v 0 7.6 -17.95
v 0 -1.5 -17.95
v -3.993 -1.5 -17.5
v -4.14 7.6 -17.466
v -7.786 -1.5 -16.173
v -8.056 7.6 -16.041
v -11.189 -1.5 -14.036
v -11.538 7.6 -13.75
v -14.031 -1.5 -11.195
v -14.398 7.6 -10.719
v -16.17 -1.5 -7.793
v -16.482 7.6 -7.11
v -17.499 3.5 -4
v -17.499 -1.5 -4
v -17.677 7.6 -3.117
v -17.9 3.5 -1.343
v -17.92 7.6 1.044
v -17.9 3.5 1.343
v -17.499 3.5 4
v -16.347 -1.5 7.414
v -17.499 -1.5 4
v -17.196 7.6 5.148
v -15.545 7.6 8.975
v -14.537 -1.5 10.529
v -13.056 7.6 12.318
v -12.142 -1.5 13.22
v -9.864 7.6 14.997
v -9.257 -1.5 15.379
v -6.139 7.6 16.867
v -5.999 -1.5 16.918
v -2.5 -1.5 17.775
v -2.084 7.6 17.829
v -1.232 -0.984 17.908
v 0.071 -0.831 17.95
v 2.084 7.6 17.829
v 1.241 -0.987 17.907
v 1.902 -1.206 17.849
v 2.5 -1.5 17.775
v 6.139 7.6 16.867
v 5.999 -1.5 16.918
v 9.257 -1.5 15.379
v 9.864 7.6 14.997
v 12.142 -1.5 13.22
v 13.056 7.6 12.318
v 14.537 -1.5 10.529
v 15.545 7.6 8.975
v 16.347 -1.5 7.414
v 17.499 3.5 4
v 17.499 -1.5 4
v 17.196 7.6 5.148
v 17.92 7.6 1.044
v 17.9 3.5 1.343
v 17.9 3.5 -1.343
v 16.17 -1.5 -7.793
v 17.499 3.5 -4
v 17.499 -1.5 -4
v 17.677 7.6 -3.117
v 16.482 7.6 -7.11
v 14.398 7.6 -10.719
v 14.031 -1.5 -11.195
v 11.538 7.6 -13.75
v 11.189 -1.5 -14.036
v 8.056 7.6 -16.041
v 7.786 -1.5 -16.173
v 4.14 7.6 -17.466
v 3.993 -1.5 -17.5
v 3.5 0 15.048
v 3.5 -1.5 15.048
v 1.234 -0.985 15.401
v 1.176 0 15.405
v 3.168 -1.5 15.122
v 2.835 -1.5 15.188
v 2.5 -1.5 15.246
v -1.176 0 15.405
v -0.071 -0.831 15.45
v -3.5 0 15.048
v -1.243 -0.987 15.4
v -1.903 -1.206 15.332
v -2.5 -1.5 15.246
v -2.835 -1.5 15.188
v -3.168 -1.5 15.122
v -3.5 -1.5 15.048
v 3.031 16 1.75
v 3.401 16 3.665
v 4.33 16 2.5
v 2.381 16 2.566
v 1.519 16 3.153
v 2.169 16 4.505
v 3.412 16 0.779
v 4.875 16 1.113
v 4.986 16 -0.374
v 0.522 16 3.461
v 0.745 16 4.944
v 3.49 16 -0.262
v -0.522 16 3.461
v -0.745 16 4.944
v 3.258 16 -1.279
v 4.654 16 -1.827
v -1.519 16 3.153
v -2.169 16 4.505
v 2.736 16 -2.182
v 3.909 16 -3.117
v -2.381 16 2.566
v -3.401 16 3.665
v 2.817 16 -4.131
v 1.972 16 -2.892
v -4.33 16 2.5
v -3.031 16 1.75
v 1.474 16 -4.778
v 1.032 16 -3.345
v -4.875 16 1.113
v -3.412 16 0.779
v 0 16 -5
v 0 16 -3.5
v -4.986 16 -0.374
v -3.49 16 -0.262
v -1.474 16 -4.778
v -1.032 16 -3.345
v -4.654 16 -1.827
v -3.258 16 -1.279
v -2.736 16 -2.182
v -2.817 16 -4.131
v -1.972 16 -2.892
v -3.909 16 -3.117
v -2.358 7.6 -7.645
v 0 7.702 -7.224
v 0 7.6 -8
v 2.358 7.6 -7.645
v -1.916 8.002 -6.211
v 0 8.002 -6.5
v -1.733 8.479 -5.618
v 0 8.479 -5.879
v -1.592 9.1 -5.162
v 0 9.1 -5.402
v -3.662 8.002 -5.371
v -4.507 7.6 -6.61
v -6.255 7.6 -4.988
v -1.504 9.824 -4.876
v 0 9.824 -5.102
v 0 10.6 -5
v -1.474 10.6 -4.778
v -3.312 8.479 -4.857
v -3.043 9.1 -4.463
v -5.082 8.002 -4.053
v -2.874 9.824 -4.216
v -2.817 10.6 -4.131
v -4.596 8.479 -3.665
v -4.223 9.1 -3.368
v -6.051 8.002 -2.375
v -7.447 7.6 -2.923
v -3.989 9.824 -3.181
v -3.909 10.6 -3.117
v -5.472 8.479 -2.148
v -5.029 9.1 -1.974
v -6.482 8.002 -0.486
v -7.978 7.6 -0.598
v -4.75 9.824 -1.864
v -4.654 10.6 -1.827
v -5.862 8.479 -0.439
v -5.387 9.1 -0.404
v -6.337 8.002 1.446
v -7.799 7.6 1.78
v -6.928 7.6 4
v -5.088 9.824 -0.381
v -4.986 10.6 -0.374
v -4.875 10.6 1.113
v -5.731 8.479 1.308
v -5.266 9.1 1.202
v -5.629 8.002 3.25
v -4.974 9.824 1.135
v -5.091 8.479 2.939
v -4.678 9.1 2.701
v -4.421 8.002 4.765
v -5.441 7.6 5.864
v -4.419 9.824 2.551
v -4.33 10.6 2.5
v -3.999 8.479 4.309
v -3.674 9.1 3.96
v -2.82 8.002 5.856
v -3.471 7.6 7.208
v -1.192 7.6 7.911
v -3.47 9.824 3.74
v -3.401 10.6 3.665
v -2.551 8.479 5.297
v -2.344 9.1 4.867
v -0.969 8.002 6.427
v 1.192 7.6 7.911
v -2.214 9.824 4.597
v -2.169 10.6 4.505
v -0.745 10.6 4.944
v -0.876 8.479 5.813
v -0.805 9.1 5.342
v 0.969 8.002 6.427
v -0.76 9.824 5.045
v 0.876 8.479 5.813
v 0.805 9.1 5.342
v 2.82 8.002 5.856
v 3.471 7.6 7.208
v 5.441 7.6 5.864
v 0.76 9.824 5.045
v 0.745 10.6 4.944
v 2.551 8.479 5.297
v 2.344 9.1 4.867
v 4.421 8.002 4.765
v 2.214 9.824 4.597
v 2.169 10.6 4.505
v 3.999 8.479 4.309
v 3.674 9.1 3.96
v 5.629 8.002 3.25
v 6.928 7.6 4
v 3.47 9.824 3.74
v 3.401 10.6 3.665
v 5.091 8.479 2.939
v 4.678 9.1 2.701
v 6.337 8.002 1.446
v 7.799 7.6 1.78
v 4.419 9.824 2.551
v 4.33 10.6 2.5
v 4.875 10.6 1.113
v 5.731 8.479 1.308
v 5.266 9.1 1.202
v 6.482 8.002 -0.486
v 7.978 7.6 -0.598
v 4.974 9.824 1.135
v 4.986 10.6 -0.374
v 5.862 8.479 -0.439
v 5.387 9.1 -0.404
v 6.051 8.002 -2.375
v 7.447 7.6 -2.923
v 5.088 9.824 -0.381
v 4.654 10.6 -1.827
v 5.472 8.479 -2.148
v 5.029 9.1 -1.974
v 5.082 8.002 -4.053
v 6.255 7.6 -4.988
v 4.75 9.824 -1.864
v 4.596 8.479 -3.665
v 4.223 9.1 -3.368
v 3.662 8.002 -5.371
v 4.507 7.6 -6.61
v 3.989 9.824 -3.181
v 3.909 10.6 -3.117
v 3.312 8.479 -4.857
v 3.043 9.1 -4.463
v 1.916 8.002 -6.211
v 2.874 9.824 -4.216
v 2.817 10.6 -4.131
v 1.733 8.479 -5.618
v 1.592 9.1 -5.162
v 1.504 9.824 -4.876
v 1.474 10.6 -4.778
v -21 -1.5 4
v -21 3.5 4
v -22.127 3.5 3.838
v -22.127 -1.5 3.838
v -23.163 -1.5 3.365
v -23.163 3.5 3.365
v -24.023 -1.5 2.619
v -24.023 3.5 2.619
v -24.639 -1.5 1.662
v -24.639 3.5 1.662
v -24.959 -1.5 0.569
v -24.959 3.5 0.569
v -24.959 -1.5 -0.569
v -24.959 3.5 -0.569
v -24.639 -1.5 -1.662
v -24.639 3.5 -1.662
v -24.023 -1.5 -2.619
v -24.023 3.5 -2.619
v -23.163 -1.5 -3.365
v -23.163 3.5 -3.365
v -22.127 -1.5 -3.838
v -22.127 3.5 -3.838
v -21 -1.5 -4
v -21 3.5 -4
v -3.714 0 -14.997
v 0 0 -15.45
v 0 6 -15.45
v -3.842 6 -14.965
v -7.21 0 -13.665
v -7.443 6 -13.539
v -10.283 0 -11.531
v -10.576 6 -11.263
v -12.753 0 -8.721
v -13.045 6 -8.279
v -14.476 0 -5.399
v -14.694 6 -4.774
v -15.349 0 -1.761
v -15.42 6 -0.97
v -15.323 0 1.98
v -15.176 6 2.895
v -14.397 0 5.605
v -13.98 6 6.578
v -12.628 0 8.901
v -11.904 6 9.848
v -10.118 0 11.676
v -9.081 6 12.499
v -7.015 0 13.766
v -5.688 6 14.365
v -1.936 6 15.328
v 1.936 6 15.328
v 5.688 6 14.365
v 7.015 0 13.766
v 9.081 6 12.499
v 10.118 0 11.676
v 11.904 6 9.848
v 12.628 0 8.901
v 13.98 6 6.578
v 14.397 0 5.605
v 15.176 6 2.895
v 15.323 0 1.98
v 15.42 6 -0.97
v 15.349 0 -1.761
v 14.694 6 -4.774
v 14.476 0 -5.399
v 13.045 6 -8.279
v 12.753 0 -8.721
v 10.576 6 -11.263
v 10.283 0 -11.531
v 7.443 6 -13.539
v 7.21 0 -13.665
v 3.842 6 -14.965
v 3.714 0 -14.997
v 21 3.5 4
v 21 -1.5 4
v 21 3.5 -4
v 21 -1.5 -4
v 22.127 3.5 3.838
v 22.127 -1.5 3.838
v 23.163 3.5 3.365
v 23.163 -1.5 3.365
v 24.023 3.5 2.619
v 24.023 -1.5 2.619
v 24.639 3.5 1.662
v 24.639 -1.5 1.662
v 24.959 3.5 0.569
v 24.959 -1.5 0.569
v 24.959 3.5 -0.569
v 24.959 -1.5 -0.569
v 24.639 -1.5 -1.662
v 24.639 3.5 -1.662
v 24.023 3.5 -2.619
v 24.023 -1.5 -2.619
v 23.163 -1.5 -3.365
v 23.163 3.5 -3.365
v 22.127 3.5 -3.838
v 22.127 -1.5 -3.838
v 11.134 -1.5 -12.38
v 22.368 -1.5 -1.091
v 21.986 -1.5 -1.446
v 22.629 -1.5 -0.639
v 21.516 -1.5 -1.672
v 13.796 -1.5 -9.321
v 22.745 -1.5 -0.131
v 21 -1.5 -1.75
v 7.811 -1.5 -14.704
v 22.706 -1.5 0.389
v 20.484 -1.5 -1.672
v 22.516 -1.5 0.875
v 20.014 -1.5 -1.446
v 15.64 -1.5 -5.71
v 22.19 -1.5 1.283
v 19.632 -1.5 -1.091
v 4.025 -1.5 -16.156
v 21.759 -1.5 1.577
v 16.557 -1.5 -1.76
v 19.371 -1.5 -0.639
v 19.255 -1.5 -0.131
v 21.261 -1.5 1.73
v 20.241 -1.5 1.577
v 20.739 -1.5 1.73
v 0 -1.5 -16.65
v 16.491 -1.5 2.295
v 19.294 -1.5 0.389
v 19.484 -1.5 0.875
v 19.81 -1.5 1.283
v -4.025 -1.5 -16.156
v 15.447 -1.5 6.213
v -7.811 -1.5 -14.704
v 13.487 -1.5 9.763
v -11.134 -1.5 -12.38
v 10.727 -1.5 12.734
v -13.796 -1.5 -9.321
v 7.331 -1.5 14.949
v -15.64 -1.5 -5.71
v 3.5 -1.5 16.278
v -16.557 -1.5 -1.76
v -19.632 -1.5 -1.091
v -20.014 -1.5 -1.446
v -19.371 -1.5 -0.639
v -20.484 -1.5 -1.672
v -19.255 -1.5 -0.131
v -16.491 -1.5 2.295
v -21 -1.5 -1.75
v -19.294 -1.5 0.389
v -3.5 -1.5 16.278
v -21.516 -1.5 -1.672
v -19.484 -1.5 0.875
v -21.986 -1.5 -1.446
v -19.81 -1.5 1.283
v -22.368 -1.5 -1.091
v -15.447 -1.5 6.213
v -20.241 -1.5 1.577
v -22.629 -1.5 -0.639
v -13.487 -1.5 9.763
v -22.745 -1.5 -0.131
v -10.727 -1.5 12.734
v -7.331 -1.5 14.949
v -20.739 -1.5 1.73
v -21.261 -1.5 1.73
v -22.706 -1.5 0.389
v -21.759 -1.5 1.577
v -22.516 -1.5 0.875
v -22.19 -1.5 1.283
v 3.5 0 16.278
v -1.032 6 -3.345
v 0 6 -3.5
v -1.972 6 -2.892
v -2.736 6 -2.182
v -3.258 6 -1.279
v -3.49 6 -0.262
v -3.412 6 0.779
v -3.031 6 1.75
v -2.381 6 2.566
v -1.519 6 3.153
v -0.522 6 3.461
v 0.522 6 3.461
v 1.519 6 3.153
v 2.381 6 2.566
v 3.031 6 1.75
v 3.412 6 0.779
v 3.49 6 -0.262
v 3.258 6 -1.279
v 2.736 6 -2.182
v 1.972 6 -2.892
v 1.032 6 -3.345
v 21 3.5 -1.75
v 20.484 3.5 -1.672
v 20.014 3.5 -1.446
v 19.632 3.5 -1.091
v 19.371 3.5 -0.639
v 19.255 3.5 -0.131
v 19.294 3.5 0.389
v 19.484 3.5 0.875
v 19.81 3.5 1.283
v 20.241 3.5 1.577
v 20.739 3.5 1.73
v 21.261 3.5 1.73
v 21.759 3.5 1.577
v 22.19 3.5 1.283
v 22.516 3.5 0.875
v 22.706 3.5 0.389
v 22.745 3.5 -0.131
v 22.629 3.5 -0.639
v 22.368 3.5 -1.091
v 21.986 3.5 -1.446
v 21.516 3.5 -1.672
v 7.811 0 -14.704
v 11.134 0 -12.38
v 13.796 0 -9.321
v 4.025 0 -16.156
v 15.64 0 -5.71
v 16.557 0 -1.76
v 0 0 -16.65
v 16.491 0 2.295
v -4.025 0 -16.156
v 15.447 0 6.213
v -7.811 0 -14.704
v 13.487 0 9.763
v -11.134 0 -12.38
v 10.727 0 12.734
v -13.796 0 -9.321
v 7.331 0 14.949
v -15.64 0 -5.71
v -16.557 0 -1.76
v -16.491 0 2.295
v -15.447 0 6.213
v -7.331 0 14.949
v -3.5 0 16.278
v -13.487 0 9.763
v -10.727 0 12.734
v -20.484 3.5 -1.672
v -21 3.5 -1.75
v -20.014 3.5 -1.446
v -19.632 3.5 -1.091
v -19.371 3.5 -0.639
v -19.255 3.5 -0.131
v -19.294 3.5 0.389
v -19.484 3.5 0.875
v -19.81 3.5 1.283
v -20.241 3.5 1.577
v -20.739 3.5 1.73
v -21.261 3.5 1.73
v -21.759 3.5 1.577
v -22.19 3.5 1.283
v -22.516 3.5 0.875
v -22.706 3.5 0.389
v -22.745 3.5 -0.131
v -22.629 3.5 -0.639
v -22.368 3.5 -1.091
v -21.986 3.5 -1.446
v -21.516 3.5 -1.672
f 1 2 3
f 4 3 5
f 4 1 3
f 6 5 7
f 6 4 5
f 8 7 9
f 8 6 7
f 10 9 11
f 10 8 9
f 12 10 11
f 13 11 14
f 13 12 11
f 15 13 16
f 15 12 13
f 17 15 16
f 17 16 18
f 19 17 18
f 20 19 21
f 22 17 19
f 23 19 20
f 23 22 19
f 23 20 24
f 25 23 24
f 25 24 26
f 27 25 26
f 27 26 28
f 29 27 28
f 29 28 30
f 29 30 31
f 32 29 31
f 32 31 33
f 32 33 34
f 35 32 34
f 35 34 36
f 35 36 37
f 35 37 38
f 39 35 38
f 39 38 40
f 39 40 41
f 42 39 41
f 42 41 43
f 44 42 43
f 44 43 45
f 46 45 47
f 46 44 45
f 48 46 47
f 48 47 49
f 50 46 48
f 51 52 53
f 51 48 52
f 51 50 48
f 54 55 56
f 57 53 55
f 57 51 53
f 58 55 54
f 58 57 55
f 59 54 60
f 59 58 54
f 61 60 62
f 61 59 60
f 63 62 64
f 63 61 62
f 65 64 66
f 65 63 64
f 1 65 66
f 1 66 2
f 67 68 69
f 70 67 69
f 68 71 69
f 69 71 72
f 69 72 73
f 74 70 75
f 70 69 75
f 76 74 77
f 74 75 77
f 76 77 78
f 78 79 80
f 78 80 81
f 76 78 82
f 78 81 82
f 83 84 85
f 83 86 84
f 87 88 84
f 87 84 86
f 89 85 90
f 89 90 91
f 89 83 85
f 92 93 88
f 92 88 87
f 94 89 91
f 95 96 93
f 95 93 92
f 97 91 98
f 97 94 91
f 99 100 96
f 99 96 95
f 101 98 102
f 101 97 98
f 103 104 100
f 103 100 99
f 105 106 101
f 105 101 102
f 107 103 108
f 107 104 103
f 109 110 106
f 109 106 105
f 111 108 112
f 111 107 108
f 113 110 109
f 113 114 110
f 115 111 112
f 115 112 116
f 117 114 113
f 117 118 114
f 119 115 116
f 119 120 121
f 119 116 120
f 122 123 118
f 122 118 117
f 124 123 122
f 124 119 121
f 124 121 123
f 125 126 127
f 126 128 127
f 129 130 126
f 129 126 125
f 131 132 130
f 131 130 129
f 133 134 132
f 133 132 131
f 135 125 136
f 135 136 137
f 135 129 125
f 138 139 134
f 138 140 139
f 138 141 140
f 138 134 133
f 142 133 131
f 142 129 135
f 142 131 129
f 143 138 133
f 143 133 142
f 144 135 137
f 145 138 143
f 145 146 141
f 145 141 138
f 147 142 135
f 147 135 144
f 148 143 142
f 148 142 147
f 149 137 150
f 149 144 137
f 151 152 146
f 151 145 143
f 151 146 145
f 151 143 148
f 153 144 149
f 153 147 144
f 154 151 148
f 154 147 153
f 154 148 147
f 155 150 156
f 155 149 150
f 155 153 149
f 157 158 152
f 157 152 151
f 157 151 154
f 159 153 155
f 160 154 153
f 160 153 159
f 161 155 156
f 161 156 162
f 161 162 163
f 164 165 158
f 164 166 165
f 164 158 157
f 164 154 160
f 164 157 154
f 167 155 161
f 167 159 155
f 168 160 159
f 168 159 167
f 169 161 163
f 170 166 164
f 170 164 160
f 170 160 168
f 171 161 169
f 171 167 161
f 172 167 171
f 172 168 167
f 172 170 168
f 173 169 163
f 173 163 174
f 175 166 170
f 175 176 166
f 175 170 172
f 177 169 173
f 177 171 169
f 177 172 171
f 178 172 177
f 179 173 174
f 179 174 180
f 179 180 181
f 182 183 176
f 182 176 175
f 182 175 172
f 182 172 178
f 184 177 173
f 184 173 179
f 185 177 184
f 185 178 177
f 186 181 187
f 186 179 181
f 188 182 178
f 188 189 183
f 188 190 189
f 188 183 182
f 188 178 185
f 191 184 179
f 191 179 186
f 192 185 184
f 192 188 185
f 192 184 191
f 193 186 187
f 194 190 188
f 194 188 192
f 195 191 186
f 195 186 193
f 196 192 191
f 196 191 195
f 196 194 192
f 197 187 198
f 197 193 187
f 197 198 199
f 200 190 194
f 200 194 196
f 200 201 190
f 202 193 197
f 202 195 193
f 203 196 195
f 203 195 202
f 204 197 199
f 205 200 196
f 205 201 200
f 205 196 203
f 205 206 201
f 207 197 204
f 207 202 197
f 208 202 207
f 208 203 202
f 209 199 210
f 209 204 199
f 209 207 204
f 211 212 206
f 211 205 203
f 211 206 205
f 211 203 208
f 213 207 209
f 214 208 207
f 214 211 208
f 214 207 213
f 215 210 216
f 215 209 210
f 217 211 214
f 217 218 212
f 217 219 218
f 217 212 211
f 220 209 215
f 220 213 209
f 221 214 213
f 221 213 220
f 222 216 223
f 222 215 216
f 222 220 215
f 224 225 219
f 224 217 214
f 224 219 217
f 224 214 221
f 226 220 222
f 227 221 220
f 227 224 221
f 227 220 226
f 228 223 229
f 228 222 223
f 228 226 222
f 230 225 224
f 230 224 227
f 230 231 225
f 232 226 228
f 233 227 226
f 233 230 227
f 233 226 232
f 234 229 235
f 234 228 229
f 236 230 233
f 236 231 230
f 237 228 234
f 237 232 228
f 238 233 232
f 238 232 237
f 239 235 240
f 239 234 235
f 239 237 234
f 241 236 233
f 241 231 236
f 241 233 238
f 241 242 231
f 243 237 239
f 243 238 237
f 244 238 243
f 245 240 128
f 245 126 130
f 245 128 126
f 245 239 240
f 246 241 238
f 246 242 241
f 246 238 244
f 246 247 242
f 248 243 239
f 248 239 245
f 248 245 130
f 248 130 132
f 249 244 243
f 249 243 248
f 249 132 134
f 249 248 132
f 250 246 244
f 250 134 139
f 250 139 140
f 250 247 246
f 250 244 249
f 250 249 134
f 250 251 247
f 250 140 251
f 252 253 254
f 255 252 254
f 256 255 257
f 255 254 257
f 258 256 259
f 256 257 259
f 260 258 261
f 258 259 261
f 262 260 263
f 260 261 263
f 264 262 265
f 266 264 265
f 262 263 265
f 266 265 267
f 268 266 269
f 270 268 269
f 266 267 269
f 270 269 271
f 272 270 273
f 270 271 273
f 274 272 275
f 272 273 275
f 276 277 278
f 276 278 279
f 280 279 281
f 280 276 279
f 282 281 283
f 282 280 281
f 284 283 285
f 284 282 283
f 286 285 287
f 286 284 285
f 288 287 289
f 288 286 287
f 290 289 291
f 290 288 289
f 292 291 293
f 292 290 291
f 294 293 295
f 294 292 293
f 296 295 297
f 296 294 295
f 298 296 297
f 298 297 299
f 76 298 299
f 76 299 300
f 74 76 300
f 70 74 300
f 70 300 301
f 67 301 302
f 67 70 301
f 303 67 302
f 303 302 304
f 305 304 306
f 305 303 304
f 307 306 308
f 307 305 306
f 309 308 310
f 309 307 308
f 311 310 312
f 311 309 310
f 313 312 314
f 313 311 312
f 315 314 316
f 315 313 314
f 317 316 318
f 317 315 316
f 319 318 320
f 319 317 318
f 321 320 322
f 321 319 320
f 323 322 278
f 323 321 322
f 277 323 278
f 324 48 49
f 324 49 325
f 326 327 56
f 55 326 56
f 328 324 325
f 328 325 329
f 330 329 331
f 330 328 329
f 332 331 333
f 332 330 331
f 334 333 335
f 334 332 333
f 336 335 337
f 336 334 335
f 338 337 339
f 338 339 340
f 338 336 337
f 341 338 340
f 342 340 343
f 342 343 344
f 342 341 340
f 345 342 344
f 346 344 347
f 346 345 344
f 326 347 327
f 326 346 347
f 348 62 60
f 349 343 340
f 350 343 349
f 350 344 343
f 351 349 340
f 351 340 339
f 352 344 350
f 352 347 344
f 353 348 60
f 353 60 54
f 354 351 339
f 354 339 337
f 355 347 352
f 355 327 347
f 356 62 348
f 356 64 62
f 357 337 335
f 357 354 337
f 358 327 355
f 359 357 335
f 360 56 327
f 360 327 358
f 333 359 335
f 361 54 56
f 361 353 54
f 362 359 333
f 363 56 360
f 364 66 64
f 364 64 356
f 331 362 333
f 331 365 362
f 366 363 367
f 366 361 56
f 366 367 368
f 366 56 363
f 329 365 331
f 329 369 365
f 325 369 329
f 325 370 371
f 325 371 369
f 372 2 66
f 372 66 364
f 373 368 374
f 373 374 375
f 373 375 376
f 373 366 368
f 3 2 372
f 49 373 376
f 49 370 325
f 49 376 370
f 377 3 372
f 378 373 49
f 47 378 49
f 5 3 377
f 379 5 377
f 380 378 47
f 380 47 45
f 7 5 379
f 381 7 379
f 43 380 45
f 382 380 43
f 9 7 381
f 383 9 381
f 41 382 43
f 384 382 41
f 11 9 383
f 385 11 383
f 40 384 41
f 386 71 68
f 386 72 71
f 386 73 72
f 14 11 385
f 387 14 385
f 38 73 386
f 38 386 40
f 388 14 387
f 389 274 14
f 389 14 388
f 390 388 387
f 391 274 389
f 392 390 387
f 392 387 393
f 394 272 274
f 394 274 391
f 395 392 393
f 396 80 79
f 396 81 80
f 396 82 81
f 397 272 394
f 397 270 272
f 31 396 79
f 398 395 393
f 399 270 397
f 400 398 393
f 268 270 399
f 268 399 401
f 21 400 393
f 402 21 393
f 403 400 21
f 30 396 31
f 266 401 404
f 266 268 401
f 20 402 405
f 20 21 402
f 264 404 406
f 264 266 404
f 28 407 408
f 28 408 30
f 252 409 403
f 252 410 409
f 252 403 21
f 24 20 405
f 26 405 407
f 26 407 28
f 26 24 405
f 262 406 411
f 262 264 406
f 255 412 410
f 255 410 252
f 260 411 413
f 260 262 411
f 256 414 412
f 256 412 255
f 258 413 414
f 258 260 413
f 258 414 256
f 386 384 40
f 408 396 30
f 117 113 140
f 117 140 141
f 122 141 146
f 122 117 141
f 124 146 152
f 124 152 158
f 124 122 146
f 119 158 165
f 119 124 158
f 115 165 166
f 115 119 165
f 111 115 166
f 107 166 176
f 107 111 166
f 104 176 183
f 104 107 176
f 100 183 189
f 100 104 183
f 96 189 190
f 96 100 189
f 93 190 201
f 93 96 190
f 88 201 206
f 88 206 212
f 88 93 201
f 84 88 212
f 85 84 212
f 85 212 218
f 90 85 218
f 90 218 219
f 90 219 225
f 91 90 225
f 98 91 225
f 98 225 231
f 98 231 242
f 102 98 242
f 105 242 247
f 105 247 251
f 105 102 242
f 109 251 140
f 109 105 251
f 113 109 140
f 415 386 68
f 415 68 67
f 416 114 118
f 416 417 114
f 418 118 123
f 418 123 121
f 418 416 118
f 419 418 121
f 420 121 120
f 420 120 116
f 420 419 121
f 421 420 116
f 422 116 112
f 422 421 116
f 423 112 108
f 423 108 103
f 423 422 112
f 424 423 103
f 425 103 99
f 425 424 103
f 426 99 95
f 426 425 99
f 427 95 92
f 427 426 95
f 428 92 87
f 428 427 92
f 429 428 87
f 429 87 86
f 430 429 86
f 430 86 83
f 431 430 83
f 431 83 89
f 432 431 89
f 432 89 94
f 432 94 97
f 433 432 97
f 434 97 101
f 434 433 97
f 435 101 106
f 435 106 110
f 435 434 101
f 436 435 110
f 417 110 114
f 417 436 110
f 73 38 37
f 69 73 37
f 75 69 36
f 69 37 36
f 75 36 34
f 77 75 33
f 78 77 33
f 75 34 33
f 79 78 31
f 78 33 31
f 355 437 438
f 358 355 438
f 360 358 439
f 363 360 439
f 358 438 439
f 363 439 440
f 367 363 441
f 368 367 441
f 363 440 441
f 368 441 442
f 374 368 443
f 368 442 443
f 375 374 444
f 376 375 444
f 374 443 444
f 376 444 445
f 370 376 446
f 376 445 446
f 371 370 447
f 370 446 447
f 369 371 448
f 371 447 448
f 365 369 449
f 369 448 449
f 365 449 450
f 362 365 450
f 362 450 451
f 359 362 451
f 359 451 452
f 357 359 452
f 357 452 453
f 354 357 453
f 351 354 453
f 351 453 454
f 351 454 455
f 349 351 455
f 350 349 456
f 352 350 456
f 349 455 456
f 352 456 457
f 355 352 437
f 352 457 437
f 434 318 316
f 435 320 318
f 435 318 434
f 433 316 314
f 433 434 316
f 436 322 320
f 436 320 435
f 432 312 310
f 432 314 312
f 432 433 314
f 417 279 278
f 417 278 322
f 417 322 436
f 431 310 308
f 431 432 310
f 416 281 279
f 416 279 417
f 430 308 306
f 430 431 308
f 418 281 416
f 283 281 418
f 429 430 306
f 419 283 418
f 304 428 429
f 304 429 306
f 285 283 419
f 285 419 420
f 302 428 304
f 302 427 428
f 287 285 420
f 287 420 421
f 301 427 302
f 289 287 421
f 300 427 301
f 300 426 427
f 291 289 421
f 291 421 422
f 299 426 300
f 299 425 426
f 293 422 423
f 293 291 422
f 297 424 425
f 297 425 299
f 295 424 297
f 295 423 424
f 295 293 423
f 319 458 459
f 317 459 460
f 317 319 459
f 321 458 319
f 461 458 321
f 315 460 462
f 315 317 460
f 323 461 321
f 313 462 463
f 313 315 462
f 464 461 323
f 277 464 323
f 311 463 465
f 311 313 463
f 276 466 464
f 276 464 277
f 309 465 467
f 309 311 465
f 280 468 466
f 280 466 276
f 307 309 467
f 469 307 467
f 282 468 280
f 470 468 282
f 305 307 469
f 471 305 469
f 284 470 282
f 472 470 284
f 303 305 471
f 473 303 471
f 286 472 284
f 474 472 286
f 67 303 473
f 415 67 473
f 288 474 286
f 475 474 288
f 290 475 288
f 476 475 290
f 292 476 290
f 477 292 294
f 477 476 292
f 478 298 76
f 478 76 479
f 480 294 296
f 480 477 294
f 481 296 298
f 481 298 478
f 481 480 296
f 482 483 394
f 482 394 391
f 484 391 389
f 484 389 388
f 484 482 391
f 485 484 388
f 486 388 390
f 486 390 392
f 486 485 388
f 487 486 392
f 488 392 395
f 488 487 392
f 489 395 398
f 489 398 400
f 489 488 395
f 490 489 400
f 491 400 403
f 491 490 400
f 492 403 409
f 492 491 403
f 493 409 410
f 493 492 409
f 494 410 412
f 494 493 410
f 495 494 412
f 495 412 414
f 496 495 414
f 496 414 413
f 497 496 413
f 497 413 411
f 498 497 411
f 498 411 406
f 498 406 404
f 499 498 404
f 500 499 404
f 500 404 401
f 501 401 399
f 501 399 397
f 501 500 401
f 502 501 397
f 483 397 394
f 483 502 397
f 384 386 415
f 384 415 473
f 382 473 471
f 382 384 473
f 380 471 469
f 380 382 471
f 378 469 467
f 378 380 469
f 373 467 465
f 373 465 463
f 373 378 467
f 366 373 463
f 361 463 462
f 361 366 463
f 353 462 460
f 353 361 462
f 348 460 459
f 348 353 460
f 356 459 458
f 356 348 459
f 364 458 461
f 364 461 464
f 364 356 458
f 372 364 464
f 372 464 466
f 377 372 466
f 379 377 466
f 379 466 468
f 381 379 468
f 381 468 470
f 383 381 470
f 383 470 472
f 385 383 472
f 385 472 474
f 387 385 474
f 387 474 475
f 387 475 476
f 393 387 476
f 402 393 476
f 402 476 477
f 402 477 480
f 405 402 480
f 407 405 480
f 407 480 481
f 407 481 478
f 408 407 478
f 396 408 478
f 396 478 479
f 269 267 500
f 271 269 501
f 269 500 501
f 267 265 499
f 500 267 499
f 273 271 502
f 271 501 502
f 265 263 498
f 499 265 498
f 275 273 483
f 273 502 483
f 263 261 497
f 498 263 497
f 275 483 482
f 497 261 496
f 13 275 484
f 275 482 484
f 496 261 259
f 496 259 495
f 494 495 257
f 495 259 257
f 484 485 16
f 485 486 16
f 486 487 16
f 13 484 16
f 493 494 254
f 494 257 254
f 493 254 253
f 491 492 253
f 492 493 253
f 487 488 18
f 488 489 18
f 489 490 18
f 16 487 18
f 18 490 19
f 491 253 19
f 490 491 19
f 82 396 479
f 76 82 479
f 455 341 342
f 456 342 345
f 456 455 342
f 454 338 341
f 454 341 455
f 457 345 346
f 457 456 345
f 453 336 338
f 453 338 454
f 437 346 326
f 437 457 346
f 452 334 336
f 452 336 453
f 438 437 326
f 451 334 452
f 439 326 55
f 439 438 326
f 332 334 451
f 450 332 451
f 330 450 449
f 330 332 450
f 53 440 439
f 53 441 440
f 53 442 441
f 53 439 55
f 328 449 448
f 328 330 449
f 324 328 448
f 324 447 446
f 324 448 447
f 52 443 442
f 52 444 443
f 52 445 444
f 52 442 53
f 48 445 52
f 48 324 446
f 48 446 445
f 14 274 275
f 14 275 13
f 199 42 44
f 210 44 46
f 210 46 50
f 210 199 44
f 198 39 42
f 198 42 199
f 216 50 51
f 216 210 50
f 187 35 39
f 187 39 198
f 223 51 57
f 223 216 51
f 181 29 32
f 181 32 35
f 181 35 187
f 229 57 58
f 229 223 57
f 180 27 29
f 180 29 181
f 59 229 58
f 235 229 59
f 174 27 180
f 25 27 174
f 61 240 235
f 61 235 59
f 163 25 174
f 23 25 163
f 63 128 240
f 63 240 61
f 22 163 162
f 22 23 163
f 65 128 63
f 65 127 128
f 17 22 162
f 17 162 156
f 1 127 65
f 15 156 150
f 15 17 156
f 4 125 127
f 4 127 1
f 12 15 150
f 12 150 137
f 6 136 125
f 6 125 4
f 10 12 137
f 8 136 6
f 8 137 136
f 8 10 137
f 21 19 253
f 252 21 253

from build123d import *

# Parameters (mm, degrees)
FILLET1_R                = 3
BOSS_EXTRUDE4_REACH      = 44.135
BOSS_EXTRUDE4_END_RADIUS = 15.45
SKETCH3_W                = 7
SKETCH3_H                = 1.5
BOSS_EXTRUDE5_START      = -5
SKETCH4_R                = 1.75
BOSS_EXTRUDE5_DEPTH      = 5
CUT_EXTRUDE1_DEPTH       = 3.92
CUT_EXTRUDE1_DEPTH_BACK  = 3.19


with BuildPart() as part:
    # Sketch2 → Revolve1 (revolve)
    with BuildSketch(Plane.XY, mode=Mode.PRIVATE) as revolve1_sk:
        Polygon((3.5, 6), (15.45, 6), (15.45, 0), (16.65, 0), (16.65, -1.5), (17.95, -1.5), (17.95, 0), (17.95, 7.6), (5, 7.6), (5, 16), (3.5, 16), align=None)
    revolve(revolve1_sk.sketch.rotate(Axis((0, 0, 0), (0, 1, 0)), 90), axis=Axis((0, 0, 0), (0, 1, 0)))

    # Fillet1
    fillet1_edges = [part.edges().sort_by_distance(p)[0] for p in [
        (0, 7.6, 5),
    ]]
    fillet(fillet1_edges, radius=FILLET1_R)

    # Boss-Extrude4: up to this cylinder (the profile starts outside it)
    boss_extrude4_end = Plane(origin=(0, -0.75, 0), z_dir=(0, -1, 0)) * Cylinder(BOSS_EXTRUDE4_END_RADIUS, 120.17, mode=Mode.PRIVATE)
    # Sketch3 → Boss-Extrude4 (add, up to the surface)
    with BuildSketch(Plane(origin=(0, 0, 16.65), x_dir=(-1, 0, 0), z_dir=(0, 0, -1)), mode=Mode.PRIVATE) as boss_extrude4_sk1:
        with Locations((0, -0.75)):
            Rectangle(SKETCH3_W, SKETCH3_H)
    boss_extrude4_tool1 = extrude(boss_extrude4_sk1.sketch, amount=BOSS_EXTRUDE4_REACH, mode=Mode.PRIVATE) - boss_extrude4_end
    add(boss_extrude4_tool1.solids().sort_by_distance((0, -0.75, 16.65))[0])

    # Sketch4 → Boss-Extrude5 (add)
    with BuildSketch(Plane.XZ.offset(1.5).offset(BOSS_EXTRUDE5_START)):
        with BuildLine():
            Line((-21, -4), (-17.498642805, -4))
            ThreePointArc((-17.498642805, -4), (-17.95, 0), (-17.498642805, 4))
            Line((-17.498642805, 4), (-21, 4))
            ThreePointArc((-21, 4), (-25, 0), (-21, -4))
        make_face()
        with Locations(Location((-21, 0, 0), (0, 0, 270))):
            Circle(SKETCH4_R, mode=Mode.SUBTRACT)
    boss_extrude5 = extrude(amount=BOSS_EXTRUDE5_DEPTH)

    # Mirror1: Boss-Extrude5 across plane
    add(boss_extrude5.mirror(Plane(origin=(0, 0, 0), x_dir=(0, 0, 1), z_dir=(1, 0, 0))))

    # Sketch5 → Cut-Extrude1 (cut, two sides: drawn at the far end of the back side and taken through both)
    with BuildSketch(Plane(origin=(0, 0, 16.65), x_dir=(-1, 0, 0), z_dir=(0, 0, -1)).offset(-CUT_EXTRUDE1_DEPTH_BACK)):
        with BuildLine():
            Line((2.5, -1.5), (-2.5, -1.5))
            ThreePointArc((-2.5, -1.5), (0, -0.830127019), (2.5, -1.5))
        make_face()
    extrude(amount=CUT_EXTRUDE1_DEPTH + CUT_EXTRUDE1_DEPTH_BACK, mode=Mode.SUBTRACT)


solid = part.part
